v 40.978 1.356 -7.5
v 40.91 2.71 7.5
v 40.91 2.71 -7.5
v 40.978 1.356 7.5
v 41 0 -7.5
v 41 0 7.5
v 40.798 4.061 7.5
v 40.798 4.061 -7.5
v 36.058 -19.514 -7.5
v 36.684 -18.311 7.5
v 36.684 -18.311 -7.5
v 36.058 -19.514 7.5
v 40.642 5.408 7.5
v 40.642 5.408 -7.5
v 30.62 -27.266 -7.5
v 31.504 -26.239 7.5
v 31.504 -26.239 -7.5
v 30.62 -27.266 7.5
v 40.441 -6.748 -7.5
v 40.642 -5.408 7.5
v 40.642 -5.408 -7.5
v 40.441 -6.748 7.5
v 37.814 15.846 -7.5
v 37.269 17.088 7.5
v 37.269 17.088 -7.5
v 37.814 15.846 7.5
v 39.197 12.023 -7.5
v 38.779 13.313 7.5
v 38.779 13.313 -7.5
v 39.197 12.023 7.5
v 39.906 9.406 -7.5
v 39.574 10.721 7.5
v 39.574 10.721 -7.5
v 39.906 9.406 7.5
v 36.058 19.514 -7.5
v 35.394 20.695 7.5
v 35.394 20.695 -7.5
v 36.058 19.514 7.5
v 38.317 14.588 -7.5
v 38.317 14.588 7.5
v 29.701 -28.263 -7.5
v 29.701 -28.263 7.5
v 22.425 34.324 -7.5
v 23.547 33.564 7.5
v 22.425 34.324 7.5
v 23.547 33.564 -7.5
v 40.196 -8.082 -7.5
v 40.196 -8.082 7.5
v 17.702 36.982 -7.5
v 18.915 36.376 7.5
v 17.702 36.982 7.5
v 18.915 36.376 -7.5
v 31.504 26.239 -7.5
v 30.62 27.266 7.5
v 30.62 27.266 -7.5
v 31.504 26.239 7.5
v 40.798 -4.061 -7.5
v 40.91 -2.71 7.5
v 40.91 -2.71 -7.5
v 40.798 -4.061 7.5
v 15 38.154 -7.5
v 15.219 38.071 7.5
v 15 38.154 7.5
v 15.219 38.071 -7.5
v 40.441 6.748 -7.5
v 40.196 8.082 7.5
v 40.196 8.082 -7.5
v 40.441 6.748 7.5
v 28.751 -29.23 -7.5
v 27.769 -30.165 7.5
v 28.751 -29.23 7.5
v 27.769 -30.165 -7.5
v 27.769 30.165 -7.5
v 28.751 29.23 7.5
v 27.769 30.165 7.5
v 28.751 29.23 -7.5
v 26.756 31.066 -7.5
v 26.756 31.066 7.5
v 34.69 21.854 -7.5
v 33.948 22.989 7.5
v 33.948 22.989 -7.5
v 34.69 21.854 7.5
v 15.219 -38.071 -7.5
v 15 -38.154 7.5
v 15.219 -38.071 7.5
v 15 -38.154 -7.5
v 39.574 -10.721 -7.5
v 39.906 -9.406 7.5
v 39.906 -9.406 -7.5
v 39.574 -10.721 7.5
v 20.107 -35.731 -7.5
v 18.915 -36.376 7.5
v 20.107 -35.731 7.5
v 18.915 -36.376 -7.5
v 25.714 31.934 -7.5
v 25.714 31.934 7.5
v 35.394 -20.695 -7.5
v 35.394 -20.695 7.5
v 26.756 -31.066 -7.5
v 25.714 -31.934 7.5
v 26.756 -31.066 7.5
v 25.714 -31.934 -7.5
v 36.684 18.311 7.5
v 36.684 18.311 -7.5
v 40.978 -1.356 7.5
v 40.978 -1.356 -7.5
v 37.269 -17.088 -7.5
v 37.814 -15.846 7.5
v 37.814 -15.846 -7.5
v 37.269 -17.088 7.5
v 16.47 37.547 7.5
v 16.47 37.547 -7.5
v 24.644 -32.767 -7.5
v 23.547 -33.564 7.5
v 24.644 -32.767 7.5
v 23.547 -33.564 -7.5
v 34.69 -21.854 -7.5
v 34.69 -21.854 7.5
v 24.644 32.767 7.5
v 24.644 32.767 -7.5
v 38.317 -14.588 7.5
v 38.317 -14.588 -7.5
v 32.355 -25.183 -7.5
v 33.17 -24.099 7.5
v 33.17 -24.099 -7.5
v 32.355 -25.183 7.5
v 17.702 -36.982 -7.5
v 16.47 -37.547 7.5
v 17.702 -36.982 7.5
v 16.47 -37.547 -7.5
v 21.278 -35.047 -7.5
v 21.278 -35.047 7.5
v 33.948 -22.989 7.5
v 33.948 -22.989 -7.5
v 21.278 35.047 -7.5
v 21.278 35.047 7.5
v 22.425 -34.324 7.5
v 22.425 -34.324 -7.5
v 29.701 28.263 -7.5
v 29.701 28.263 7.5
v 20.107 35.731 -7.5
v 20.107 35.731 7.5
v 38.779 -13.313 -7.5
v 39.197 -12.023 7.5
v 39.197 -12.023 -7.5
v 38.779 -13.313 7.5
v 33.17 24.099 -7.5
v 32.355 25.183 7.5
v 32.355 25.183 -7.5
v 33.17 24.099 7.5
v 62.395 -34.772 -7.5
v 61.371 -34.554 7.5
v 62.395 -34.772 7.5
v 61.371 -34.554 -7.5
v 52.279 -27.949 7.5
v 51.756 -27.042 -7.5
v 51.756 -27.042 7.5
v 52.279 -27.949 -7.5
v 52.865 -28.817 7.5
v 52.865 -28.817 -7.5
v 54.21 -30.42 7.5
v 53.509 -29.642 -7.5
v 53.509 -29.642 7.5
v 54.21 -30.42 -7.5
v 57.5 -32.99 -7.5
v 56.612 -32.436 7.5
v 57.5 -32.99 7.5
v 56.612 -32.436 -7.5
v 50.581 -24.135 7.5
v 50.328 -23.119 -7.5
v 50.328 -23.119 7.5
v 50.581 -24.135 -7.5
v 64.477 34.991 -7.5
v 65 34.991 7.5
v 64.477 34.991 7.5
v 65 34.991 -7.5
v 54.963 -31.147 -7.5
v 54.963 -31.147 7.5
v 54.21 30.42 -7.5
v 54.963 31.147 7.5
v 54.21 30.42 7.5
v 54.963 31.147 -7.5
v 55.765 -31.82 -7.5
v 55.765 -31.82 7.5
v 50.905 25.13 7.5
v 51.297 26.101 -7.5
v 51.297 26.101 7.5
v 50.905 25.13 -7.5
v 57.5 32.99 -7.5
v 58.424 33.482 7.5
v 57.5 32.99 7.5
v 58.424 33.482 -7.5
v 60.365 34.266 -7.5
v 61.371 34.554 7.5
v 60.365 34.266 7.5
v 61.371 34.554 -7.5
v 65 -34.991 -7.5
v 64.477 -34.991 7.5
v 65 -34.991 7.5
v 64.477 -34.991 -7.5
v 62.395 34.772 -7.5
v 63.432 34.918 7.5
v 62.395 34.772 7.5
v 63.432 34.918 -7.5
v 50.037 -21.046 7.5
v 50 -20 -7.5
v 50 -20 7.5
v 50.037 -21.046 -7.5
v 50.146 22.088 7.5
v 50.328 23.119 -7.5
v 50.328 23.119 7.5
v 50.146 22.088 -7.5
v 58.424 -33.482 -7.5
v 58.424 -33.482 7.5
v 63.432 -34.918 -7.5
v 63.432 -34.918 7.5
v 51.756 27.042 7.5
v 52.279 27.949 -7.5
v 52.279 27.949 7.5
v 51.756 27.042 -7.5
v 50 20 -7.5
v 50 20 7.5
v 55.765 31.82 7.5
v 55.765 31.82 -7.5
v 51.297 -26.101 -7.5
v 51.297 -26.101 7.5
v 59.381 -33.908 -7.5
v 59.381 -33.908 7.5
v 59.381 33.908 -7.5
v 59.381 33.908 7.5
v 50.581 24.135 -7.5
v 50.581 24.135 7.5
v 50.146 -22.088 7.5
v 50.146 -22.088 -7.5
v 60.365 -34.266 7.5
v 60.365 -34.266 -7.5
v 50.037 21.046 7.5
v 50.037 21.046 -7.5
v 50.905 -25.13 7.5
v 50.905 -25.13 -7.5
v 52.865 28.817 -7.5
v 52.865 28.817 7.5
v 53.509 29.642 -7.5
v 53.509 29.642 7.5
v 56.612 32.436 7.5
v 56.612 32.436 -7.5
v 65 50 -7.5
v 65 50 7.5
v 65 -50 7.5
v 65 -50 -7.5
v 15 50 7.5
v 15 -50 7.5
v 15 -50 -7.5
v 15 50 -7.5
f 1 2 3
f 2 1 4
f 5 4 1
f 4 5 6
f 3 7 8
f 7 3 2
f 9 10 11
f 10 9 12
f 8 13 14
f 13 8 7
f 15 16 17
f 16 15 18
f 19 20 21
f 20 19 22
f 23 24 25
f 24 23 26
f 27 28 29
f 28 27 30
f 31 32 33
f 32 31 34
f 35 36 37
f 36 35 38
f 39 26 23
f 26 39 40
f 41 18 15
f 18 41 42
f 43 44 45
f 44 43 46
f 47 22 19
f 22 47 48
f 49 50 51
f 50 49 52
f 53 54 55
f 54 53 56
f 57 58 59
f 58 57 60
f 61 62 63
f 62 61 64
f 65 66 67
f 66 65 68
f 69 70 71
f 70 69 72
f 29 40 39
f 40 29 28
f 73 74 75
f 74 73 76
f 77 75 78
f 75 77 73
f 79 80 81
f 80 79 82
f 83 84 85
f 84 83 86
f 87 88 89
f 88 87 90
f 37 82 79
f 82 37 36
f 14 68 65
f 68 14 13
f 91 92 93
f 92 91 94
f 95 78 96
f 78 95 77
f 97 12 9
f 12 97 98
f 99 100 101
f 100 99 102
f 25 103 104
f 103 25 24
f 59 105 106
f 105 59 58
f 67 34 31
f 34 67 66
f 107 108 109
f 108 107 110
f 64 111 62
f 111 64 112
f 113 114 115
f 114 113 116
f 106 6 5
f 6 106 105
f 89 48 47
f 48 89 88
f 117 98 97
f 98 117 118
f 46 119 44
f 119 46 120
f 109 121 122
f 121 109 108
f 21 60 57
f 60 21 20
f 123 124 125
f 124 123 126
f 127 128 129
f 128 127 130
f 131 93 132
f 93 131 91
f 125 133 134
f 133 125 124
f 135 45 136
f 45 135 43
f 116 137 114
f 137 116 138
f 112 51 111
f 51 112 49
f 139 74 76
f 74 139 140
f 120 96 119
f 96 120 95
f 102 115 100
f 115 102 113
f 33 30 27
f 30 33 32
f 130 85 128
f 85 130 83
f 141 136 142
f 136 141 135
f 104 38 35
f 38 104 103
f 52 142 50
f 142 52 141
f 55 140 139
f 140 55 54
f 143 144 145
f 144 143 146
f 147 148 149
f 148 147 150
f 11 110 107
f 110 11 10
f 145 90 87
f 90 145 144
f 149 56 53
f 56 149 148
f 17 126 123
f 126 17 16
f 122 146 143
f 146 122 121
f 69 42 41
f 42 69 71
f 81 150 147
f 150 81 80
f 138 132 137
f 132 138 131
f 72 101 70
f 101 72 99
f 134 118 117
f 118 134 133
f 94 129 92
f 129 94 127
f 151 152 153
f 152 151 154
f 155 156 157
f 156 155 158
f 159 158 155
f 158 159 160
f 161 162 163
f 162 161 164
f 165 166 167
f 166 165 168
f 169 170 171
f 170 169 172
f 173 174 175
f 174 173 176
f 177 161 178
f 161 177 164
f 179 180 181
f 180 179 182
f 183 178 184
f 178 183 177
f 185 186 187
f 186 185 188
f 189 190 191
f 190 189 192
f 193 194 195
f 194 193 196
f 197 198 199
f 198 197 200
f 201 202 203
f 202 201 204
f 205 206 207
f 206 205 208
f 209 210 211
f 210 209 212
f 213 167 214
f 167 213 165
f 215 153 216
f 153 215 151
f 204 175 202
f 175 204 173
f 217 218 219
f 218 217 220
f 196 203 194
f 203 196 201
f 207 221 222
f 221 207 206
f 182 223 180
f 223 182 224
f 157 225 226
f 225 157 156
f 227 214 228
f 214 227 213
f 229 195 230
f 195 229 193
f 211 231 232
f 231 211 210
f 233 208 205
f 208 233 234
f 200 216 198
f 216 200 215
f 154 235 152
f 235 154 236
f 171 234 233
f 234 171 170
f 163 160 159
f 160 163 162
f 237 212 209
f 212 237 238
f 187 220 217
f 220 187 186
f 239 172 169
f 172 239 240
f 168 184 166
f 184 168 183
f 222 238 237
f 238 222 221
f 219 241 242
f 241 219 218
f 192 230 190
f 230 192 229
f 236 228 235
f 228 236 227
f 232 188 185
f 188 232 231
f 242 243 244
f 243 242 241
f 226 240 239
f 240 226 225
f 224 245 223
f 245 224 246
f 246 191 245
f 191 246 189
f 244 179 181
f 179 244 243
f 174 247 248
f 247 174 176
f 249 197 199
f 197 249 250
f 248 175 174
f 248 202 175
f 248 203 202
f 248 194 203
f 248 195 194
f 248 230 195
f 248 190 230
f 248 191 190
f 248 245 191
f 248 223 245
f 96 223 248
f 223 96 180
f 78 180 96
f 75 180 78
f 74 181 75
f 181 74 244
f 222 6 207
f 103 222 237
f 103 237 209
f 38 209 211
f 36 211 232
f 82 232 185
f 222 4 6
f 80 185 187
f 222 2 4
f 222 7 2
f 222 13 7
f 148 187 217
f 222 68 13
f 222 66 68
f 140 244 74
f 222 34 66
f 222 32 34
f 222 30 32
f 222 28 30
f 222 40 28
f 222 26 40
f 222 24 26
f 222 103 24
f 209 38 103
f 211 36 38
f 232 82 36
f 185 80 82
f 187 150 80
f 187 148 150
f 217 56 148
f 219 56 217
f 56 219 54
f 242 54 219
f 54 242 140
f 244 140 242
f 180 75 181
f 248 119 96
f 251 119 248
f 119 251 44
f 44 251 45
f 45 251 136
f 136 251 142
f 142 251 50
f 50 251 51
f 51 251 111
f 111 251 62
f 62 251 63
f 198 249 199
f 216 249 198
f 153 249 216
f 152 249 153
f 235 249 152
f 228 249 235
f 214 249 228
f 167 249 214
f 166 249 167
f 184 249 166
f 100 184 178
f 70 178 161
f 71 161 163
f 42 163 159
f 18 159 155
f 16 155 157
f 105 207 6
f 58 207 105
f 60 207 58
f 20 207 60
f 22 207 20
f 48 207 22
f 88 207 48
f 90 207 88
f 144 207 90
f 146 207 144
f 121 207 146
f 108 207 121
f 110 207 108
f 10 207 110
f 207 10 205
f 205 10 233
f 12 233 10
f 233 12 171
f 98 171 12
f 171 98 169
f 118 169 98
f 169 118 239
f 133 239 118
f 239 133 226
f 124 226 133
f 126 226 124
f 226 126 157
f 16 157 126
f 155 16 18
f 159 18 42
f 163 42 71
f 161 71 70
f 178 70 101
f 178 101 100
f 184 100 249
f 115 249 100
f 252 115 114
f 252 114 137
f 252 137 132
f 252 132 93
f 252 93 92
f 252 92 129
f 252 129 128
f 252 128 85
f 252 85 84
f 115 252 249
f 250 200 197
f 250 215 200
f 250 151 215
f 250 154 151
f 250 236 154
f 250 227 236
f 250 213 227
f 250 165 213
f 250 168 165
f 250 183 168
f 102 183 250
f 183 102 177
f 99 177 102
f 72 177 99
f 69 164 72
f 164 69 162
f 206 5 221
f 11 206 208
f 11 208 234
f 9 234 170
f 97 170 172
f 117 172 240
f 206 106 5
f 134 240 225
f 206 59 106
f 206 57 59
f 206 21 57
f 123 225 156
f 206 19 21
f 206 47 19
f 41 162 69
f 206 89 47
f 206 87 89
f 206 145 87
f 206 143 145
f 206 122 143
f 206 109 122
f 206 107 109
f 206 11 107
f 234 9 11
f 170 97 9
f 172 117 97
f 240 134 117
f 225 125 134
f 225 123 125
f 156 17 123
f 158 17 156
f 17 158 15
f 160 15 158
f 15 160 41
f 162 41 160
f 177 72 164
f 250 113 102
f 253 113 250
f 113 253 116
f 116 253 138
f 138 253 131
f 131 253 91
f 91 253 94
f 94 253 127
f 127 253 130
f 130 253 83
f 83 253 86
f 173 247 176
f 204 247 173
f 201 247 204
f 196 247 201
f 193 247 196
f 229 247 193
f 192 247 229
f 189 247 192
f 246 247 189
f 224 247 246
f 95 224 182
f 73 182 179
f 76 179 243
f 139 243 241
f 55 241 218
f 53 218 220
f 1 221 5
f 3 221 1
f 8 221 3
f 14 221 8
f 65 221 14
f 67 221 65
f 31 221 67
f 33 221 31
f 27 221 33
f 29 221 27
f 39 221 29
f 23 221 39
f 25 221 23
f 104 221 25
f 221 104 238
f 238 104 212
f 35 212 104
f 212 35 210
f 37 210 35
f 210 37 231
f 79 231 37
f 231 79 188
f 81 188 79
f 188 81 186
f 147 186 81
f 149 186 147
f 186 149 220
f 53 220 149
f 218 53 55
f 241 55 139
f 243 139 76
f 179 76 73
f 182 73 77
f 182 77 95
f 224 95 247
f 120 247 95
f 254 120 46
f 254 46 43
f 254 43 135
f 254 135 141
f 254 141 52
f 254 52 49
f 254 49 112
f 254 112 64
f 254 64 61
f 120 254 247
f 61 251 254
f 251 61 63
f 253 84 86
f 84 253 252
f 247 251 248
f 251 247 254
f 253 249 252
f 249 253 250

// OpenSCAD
//Onion farm

db = 82;//bottle diameter

difference(){
translate([40,0,0]) cube ([50,100,15], center = true);

union(){
cylinder(r=db/2,h = 25,$fn = 190, center = true);
hull(){
translate([65,20,0])cylinder(r=30/2,h = 25,$fn=90, center = true);
translate([65,-20,0])cylinder(r=30/2,h = 25,$fn=90, center = true);}}
}
